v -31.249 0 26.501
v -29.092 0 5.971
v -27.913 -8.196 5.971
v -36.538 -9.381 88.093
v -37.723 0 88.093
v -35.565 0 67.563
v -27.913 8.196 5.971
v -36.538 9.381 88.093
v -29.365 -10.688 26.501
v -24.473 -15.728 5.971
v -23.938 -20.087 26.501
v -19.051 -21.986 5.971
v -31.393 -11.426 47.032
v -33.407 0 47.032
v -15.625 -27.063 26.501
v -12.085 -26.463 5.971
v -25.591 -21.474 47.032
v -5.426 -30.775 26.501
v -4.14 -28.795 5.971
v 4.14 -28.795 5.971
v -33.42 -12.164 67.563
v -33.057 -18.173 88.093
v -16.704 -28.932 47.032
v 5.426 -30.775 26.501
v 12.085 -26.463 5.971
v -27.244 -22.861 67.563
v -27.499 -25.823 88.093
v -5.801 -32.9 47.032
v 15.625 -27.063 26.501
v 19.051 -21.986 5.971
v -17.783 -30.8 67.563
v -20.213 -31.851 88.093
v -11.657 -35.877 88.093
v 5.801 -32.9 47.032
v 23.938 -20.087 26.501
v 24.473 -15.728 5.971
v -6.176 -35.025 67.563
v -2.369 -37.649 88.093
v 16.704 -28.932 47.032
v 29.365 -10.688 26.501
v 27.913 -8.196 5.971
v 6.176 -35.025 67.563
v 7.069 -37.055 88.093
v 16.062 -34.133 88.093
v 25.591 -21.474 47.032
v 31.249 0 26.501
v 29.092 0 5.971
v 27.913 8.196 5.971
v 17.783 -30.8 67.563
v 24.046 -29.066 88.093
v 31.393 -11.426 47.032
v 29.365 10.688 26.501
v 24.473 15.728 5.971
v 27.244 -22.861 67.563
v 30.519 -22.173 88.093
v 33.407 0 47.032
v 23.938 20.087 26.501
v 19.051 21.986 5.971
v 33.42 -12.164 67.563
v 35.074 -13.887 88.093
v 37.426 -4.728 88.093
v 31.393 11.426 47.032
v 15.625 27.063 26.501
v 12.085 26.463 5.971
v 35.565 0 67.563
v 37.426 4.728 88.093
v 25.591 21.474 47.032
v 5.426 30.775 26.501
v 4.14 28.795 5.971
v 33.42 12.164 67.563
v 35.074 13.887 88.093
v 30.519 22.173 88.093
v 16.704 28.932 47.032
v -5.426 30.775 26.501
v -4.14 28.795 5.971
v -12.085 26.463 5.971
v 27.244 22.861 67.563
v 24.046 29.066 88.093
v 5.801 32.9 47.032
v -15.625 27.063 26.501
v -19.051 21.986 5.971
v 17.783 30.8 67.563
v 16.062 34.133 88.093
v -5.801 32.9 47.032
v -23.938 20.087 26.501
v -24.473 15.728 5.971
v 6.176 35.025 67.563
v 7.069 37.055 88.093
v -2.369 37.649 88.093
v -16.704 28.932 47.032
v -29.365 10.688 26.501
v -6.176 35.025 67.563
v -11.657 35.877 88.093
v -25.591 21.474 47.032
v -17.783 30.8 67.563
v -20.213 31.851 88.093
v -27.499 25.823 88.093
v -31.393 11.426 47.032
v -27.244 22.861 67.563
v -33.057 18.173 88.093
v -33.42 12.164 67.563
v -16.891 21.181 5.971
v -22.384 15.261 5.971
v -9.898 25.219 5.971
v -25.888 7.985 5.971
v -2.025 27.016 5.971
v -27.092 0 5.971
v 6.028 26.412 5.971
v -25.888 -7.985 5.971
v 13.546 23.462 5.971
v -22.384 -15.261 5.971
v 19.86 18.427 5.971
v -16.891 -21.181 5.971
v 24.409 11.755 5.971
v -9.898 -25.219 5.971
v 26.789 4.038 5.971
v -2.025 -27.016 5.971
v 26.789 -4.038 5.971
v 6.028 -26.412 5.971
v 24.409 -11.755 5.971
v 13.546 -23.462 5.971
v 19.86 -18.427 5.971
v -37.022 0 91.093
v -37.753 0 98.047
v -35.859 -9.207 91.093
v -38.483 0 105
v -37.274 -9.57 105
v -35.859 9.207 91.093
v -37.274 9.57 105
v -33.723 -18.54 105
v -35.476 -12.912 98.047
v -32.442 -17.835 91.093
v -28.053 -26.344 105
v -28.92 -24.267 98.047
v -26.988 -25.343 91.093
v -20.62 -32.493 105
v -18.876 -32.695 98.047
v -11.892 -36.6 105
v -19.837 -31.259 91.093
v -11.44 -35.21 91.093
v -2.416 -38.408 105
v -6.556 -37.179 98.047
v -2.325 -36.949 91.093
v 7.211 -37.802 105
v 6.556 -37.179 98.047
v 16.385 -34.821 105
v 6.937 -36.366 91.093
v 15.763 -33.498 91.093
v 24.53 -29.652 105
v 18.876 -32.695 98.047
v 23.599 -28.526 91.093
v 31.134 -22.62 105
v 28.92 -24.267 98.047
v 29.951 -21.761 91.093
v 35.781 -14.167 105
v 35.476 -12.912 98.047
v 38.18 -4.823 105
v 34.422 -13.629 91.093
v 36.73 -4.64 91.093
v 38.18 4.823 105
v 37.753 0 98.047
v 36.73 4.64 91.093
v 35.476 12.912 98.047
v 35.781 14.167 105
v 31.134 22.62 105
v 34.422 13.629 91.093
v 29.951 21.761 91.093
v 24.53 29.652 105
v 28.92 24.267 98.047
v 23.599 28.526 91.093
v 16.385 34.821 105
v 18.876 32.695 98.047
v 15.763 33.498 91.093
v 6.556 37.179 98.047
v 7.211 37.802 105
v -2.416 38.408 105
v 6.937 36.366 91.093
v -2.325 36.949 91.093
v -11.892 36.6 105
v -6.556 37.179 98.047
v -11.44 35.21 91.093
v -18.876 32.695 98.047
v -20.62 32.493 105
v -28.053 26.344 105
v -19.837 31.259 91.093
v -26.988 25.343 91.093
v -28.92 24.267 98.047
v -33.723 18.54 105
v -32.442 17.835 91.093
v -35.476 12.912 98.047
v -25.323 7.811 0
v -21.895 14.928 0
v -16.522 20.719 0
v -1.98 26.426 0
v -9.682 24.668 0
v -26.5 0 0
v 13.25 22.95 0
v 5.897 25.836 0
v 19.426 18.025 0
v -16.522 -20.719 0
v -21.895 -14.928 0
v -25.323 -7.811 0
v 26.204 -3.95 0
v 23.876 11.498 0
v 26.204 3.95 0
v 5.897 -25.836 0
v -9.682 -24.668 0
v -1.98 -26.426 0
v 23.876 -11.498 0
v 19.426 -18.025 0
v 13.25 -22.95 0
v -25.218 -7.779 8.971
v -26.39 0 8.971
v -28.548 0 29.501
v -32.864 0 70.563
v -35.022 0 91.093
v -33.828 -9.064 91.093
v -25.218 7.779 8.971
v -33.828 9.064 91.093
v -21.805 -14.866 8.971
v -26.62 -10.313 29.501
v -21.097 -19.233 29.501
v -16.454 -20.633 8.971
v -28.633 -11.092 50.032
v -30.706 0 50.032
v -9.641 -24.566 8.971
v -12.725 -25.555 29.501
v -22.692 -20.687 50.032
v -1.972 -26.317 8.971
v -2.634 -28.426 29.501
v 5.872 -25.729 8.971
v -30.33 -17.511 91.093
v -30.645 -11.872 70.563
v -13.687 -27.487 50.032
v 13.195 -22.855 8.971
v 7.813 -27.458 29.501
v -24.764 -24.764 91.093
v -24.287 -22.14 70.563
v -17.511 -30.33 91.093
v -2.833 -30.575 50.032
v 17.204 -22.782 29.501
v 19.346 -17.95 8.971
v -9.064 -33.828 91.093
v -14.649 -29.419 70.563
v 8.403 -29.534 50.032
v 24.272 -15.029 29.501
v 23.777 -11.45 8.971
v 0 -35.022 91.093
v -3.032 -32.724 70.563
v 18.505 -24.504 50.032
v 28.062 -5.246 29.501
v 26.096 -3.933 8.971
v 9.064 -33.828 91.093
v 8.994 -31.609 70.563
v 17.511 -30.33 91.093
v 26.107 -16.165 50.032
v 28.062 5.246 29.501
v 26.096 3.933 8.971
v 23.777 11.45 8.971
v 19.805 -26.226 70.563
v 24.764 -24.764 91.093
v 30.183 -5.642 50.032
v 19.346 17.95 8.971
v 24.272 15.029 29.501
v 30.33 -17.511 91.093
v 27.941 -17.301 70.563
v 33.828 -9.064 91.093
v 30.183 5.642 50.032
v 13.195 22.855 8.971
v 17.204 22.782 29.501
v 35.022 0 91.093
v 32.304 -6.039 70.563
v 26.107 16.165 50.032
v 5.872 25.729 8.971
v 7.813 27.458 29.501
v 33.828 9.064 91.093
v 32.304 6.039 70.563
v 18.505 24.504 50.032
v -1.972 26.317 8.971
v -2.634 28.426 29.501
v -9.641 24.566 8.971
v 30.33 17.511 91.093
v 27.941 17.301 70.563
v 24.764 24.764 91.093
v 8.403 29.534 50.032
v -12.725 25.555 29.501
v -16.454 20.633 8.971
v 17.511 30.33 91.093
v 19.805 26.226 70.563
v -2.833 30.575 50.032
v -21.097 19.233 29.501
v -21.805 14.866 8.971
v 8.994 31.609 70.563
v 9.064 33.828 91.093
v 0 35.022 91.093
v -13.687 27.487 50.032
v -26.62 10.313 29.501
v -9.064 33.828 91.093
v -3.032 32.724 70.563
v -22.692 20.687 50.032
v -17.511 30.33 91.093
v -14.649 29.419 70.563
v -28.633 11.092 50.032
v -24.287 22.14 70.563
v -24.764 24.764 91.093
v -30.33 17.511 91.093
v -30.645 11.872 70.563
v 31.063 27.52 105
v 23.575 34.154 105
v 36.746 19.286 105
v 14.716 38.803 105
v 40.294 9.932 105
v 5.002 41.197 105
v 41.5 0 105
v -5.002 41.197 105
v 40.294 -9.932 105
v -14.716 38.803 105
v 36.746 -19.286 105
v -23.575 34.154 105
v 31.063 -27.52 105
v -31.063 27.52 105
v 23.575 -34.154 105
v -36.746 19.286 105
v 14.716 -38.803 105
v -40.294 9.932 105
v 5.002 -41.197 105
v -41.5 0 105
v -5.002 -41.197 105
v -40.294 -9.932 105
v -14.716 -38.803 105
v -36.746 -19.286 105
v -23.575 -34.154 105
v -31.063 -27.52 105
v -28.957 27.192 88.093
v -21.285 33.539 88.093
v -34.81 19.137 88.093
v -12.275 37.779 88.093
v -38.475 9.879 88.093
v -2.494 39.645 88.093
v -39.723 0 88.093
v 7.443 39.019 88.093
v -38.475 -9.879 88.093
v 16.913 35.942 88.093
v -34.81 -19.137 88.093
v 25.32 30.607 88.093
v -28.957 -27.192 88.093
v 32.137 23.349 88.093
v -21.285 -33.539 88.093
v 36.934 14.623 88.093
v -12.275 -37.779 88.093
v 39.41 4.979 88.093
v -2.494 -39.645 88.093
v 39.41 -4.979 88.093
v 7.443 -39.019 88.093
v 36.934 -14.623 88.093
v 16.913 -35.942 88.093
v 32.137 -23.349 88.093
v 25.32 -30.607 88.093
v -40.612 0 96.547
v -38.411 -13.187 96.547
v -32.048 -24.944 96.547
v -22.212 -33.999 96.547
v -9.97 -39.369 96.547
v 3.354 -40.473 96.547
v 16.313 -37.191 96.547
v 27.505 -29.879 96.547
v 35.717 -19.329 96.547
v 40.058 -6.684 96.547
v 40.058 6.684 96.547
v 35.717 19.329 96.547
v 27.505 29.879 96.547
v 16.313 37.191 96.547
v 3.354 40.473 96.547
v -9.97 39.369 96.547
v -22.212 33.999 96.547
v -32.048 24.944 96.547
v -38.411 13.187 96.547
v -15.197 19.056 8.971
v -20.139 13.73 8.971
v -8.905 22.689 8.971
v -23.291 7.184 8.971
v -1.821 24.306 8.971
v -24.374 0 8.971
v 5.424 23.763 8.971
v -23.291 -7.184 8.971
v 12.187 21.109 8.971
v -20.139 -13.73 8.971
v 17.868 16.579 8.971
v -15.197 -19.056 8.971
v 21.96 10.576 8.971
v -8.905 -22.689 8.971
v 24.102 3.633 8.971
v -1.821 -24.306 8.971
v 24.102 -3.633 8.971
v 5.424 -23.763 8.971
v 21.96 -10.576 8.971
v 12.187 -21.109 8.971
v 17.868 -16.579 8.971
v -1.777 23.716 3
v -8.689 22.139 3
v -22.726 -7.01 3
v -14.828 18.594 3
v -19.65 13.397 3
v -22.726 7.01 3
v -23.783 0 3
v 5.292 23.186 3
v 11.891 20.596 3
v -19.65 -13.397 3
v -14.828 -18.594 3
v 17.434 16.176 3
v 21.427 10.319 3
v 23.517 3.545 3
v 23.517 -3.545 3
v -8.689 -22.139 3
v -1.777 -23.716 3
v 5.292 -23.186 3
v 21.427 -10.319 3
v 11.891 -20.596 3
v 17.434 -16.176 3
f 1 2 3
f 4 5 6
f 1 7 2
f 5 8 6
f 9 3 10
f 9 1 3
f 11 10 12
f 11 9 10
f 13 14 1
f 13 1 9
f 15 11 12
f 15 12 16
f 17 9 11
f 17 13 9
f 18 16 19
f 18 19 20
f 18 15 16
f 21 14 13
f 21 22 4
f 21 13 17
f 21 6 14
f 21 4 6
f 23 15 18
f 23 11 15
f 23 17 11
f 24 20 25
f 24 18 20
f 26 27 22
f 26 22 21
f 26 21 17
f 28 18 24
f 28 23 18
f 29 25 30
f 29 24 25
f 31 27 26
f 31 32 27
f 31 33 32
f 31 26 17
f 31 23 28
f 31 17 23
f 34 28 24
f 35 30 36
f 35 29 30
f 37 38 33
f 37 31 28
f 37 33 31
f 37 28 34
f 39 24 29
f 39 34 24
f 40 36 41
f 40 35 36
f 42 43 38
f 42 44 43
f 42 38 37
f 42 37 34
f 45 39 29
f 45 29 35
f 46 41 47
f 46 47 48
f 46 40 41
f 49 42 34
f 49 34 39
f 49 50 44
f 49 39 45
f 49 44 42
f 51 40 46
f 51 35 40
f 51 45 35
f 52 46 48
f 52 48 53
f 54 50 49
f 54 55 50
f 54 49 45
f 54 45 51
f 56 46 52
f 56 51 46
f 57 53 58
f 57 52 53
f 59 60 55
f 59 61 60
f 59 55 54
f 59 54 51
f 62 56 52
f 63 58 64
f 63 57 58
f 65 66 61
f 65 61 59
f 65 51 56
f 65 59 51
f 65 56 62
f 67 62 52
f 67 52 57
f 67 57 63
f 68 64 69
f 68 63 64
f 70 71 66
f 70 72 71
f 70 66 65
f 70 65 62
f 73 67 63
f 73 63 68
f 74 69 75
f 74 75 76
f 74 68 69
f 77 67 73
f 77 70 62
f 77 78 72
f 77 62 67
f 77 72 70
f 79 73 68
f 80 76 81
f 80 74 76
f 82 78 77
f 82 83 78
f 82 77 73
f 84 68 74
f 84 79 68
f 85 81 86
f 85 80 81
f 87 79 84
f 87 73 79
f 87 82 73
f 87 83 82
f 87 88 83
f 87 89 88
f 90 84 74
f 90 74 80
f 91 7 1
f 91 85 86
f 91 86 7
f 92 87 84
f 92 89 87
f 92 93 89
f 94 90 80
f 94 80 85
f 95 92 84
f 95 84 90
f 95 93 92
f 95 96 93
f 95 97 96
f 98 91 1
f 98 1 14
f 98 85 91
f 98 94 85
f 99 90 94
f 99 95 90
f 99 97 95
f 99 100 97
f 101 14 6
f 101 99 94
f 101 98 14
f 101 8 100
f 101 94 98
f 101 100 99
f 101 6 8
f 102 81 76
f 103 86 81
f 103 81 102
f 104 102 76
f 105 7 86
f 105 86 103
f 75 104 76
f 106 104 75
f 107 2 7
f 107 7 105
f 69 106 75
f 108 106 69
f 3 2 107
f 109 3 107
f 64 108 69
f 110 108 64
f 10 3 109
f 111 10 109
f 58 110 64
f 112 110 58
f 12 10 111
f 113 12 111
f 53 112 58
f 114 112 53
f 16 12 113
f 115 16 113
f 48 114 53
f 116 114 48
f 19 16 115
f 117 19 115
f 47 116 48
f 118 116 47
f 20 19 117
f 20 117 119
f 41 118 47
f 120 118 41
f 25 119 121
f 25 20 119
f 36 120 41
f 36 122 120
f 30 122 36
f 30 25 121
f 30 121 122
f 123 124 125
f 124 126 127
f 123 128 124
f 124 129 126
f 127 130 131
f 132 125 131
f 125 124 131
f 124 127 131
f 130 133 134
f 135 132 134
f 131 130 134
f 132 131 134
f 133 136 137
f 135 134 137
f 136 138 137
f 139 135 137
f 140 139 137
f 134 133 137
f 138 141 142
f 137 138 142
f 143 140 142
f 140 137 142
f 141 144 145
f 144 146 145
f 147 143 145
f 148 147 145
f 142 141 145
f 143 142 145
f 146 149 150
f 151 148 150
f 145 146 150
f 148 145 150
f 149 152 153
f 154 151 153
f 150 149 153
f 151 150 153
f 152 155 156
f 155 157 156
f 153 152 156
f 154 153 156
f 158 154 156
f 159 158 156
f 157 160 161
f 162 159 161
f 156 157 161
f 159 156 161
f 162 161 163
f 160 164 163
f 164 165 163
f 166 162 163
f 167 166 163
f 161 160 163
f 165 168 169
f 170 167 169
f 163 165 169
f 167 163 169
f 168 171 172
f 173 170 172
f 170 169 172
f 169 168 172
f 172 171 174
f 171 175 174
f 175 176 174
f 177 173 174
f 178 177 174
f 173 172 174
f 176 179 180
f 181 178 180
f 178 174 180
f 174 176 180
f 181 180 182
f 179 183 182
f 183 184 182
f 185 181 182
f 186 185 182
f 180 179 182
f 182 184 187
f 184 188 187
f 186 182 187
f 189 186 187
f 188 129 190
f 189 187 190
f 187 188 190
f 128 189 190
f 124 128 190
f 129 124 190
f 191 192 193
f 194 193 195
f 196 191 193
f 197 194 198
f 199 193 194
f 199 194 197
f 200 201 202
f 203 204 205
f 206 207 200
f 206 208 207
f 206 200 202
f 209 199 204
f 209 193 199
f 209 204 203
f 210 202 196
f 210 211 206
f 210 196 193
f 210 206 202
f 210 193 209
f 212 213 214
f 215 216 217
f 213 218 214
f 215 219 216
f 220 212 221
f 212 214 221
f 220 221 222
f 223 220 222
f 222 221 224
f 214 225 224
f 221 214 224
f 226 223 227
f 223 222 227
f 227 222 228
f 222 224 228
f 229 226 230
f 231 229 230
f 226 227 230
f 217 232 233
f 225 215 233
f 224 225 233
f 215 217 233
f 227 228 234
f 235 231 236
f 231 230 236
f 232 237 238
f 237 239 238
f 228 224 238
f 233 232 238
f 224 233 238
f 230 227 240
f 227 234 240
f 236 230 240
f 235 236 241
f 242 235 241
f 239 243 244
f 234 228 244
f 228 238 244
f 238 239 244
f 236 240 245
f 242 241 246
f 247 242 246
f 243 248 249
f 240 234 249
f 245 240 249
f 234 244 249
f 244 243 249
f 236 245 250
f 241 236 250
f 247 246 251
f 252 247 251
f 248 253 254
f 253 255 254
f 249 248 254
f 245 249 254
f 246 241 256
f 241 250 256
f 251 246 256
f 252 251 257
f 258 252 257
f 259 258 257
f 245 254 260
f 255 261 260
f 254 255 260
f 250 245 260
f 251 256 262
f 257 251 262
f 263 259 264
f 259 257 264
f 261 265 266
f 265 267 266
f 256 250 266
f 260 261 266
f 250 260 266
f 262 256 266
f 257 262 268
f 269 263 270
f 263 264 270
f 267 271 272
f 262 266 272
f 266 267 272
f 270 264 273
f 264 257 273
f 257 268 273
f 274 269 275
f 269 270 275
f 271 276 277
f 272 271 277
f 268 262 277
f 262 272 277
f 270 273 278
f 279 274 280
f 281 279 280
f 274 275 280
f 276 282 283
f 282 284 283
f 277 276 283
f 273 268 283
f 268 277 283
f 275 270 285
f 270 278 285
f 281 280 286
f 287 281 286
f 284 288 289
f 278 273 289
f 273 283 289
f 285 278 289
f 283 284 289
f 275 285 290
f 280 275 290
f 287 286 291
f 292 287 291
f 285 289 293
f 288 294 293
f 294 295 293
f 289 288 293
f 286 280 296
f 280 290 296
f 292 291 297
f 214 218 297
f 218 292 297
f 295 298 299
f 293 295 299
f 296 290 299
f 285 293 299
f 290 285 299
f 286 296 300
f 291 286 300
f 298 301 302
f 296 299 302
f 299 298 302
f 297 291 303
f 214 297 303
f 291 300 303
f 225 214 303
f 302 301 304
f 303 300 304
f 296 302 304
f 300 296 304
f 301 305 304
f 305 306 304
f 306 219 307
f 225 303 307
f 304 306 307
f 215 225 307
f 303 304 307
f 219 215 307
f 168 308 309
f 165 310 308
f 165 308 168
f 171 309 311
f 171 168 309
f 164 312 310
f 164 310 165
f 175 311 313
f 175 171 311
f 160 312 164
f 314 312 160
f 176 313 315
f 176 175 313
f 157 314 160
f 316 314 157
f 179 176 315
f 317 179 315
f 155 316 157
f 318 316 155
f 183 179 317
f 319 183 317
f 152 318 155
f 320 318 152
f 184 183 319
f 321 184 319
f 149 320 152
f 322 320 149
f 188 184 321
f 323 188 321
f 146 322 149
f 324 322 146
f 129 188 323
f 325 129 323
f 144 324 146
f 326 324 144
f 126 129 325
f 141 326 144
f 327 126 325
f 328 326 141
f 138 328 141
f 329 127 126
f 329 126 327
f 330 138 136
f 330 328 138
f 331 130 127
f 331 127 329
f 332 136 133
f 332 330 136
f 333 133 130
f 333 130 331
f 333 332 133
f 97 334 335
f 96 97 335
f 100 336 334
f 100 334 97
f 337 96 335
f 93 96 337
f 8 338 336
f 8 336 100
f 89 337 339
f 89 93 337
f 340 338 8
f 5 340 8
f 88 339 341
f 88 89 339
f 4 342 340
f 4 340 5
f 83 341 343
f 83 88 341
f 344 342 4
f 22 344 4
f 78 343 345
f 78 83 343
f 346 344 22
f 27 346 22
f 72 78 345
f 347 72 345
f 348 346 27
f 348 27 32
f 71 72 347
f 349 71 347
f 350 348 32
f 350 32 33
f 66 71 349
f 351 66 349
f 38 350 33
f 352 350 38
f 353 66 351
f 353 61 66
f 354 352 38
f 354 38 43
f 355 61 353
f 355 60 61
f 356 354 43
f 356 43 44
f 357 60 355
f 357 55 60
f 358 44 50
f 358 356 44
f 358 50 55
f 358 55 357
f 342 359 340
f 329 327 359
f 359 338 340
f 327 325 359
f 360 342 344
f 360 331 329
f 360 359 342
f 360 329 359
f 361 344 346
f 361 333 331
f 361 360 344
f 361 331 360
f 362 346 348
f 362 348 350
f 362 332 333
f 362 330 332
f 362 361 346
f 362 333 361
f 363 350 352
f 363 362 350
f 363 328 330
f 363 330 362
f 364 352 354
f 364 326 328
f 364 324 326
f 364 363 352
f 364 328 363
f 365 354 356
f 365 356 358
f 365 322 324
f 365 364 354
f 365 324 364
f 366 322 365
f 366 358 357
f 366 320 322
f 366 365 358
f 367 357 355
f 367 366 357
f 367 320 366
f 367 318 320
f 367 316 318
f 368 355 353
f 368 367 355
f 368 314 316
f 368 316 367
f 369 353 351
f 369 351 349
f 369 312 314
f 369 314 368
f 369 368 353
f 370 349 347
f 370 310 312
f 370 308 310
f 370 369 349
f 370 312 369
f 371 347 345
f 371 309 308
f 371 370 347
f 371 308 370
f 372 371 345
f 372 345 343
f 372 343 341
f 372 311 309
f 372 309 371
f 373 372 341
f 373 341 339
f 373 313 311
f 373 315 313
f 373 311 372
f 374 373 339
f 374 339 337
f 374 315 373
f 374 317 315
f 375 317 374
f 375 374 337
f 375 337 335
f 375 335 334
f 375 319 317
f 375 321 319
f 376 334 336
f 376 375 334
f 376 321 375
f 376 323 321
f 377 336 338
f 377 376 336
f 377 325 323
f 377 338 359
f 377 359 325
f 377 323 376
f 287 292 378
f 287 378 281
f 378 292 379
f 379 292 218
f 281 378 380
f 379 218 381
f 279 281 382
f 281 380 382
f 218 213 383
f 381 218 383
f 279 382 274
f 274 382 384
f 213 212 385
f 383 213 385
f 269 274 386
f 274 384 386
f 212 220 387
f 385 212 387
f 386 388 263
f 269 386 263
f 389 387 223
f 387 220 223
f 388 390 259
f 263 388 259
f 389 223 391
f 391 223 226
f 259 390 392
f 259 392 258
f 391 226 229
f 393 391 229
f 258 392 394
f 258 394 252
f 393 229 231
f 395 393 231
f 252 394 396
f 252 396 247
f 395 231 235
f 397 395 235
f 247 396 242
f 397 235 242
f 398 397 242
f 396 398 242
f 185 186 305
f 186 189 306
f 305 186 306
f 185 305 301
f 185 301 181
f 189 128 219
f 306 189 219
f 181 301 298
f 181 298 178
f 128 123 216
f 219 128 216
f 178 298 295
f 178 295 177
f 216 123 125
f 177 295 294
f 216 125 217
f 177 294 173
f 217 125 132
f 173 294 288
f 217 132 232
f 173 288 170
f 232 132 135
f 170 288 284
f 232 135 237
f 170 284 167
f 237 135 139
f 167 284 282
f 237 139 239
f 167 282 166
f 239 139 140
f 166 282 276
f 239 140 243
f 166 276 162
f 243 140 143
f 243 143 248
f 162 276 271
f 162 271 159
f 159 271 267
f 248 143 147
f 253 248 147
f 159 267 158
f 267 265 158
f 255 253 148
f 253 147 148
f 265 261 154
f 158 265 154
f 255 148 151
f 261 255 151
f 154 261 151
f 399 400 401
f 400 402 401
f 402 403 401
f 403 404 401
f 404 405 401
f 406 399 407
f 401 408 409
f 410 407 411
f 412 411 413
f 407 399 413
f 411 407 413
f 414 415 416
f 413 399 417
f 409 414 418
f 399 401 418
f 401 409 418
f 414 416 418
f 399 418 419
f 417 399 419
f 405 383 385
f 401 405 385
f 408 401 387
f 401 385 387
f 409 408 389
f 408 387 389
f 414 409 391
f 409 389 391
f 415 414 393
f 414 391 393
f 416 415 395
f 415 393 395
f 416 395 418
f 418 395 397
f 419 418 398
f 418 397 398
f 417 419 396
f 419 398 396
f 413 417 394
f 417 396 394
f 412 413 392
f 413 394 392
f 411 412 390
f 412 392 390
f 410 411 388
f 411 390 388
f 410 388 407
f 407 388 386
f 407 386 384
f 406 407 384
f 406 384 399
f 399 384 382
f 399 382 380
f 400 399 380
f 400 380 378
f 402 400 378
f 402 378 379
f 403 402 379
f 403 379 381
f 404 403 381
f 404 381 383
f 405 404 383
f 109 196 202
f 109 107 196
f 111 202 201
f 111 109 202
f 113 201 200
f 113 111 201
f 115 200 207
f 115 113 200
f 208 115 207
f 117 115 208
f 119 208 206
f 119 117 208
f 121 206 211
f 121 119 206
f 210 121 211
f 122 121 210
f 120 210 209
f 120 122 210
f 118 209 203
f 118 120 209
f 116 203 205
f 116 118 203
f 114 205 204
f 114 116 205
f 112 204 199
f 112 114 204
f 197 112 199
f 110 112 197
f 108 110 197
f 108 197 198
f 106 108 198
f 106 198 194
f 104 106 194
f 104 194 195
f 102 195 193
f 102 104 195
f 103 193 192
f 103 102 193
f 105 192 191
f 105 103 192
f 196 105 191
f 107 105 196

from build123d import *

# Parameters (mm, degrees)
THICKNESS_T = -3


with BuildPart() as part:
    # Sketch → Revolution (revolve)
    with BuildSketch(Plane.XZ):
        Polygon((0, 0), (-26.5, 0), (-27.091608, 5.970762), (-29.091608, 5.970762), (-37.723016, 88.093128), (-39.723016, 88.093128), (-41.5, 105), (0, 105), align=None)
    revolve(axis=Axis((0, 0, 0), (0, 0, 1)))

    # Thickness
    thickness_openings = [part.faces().sort_by_distance(p)[0] for p in [
        (0, 0, 105),
    ]]
    offset(amount=THICKNESS_T, openings=thickness_openings, kind=Kind.INTERSECTION)


solid = part.part
